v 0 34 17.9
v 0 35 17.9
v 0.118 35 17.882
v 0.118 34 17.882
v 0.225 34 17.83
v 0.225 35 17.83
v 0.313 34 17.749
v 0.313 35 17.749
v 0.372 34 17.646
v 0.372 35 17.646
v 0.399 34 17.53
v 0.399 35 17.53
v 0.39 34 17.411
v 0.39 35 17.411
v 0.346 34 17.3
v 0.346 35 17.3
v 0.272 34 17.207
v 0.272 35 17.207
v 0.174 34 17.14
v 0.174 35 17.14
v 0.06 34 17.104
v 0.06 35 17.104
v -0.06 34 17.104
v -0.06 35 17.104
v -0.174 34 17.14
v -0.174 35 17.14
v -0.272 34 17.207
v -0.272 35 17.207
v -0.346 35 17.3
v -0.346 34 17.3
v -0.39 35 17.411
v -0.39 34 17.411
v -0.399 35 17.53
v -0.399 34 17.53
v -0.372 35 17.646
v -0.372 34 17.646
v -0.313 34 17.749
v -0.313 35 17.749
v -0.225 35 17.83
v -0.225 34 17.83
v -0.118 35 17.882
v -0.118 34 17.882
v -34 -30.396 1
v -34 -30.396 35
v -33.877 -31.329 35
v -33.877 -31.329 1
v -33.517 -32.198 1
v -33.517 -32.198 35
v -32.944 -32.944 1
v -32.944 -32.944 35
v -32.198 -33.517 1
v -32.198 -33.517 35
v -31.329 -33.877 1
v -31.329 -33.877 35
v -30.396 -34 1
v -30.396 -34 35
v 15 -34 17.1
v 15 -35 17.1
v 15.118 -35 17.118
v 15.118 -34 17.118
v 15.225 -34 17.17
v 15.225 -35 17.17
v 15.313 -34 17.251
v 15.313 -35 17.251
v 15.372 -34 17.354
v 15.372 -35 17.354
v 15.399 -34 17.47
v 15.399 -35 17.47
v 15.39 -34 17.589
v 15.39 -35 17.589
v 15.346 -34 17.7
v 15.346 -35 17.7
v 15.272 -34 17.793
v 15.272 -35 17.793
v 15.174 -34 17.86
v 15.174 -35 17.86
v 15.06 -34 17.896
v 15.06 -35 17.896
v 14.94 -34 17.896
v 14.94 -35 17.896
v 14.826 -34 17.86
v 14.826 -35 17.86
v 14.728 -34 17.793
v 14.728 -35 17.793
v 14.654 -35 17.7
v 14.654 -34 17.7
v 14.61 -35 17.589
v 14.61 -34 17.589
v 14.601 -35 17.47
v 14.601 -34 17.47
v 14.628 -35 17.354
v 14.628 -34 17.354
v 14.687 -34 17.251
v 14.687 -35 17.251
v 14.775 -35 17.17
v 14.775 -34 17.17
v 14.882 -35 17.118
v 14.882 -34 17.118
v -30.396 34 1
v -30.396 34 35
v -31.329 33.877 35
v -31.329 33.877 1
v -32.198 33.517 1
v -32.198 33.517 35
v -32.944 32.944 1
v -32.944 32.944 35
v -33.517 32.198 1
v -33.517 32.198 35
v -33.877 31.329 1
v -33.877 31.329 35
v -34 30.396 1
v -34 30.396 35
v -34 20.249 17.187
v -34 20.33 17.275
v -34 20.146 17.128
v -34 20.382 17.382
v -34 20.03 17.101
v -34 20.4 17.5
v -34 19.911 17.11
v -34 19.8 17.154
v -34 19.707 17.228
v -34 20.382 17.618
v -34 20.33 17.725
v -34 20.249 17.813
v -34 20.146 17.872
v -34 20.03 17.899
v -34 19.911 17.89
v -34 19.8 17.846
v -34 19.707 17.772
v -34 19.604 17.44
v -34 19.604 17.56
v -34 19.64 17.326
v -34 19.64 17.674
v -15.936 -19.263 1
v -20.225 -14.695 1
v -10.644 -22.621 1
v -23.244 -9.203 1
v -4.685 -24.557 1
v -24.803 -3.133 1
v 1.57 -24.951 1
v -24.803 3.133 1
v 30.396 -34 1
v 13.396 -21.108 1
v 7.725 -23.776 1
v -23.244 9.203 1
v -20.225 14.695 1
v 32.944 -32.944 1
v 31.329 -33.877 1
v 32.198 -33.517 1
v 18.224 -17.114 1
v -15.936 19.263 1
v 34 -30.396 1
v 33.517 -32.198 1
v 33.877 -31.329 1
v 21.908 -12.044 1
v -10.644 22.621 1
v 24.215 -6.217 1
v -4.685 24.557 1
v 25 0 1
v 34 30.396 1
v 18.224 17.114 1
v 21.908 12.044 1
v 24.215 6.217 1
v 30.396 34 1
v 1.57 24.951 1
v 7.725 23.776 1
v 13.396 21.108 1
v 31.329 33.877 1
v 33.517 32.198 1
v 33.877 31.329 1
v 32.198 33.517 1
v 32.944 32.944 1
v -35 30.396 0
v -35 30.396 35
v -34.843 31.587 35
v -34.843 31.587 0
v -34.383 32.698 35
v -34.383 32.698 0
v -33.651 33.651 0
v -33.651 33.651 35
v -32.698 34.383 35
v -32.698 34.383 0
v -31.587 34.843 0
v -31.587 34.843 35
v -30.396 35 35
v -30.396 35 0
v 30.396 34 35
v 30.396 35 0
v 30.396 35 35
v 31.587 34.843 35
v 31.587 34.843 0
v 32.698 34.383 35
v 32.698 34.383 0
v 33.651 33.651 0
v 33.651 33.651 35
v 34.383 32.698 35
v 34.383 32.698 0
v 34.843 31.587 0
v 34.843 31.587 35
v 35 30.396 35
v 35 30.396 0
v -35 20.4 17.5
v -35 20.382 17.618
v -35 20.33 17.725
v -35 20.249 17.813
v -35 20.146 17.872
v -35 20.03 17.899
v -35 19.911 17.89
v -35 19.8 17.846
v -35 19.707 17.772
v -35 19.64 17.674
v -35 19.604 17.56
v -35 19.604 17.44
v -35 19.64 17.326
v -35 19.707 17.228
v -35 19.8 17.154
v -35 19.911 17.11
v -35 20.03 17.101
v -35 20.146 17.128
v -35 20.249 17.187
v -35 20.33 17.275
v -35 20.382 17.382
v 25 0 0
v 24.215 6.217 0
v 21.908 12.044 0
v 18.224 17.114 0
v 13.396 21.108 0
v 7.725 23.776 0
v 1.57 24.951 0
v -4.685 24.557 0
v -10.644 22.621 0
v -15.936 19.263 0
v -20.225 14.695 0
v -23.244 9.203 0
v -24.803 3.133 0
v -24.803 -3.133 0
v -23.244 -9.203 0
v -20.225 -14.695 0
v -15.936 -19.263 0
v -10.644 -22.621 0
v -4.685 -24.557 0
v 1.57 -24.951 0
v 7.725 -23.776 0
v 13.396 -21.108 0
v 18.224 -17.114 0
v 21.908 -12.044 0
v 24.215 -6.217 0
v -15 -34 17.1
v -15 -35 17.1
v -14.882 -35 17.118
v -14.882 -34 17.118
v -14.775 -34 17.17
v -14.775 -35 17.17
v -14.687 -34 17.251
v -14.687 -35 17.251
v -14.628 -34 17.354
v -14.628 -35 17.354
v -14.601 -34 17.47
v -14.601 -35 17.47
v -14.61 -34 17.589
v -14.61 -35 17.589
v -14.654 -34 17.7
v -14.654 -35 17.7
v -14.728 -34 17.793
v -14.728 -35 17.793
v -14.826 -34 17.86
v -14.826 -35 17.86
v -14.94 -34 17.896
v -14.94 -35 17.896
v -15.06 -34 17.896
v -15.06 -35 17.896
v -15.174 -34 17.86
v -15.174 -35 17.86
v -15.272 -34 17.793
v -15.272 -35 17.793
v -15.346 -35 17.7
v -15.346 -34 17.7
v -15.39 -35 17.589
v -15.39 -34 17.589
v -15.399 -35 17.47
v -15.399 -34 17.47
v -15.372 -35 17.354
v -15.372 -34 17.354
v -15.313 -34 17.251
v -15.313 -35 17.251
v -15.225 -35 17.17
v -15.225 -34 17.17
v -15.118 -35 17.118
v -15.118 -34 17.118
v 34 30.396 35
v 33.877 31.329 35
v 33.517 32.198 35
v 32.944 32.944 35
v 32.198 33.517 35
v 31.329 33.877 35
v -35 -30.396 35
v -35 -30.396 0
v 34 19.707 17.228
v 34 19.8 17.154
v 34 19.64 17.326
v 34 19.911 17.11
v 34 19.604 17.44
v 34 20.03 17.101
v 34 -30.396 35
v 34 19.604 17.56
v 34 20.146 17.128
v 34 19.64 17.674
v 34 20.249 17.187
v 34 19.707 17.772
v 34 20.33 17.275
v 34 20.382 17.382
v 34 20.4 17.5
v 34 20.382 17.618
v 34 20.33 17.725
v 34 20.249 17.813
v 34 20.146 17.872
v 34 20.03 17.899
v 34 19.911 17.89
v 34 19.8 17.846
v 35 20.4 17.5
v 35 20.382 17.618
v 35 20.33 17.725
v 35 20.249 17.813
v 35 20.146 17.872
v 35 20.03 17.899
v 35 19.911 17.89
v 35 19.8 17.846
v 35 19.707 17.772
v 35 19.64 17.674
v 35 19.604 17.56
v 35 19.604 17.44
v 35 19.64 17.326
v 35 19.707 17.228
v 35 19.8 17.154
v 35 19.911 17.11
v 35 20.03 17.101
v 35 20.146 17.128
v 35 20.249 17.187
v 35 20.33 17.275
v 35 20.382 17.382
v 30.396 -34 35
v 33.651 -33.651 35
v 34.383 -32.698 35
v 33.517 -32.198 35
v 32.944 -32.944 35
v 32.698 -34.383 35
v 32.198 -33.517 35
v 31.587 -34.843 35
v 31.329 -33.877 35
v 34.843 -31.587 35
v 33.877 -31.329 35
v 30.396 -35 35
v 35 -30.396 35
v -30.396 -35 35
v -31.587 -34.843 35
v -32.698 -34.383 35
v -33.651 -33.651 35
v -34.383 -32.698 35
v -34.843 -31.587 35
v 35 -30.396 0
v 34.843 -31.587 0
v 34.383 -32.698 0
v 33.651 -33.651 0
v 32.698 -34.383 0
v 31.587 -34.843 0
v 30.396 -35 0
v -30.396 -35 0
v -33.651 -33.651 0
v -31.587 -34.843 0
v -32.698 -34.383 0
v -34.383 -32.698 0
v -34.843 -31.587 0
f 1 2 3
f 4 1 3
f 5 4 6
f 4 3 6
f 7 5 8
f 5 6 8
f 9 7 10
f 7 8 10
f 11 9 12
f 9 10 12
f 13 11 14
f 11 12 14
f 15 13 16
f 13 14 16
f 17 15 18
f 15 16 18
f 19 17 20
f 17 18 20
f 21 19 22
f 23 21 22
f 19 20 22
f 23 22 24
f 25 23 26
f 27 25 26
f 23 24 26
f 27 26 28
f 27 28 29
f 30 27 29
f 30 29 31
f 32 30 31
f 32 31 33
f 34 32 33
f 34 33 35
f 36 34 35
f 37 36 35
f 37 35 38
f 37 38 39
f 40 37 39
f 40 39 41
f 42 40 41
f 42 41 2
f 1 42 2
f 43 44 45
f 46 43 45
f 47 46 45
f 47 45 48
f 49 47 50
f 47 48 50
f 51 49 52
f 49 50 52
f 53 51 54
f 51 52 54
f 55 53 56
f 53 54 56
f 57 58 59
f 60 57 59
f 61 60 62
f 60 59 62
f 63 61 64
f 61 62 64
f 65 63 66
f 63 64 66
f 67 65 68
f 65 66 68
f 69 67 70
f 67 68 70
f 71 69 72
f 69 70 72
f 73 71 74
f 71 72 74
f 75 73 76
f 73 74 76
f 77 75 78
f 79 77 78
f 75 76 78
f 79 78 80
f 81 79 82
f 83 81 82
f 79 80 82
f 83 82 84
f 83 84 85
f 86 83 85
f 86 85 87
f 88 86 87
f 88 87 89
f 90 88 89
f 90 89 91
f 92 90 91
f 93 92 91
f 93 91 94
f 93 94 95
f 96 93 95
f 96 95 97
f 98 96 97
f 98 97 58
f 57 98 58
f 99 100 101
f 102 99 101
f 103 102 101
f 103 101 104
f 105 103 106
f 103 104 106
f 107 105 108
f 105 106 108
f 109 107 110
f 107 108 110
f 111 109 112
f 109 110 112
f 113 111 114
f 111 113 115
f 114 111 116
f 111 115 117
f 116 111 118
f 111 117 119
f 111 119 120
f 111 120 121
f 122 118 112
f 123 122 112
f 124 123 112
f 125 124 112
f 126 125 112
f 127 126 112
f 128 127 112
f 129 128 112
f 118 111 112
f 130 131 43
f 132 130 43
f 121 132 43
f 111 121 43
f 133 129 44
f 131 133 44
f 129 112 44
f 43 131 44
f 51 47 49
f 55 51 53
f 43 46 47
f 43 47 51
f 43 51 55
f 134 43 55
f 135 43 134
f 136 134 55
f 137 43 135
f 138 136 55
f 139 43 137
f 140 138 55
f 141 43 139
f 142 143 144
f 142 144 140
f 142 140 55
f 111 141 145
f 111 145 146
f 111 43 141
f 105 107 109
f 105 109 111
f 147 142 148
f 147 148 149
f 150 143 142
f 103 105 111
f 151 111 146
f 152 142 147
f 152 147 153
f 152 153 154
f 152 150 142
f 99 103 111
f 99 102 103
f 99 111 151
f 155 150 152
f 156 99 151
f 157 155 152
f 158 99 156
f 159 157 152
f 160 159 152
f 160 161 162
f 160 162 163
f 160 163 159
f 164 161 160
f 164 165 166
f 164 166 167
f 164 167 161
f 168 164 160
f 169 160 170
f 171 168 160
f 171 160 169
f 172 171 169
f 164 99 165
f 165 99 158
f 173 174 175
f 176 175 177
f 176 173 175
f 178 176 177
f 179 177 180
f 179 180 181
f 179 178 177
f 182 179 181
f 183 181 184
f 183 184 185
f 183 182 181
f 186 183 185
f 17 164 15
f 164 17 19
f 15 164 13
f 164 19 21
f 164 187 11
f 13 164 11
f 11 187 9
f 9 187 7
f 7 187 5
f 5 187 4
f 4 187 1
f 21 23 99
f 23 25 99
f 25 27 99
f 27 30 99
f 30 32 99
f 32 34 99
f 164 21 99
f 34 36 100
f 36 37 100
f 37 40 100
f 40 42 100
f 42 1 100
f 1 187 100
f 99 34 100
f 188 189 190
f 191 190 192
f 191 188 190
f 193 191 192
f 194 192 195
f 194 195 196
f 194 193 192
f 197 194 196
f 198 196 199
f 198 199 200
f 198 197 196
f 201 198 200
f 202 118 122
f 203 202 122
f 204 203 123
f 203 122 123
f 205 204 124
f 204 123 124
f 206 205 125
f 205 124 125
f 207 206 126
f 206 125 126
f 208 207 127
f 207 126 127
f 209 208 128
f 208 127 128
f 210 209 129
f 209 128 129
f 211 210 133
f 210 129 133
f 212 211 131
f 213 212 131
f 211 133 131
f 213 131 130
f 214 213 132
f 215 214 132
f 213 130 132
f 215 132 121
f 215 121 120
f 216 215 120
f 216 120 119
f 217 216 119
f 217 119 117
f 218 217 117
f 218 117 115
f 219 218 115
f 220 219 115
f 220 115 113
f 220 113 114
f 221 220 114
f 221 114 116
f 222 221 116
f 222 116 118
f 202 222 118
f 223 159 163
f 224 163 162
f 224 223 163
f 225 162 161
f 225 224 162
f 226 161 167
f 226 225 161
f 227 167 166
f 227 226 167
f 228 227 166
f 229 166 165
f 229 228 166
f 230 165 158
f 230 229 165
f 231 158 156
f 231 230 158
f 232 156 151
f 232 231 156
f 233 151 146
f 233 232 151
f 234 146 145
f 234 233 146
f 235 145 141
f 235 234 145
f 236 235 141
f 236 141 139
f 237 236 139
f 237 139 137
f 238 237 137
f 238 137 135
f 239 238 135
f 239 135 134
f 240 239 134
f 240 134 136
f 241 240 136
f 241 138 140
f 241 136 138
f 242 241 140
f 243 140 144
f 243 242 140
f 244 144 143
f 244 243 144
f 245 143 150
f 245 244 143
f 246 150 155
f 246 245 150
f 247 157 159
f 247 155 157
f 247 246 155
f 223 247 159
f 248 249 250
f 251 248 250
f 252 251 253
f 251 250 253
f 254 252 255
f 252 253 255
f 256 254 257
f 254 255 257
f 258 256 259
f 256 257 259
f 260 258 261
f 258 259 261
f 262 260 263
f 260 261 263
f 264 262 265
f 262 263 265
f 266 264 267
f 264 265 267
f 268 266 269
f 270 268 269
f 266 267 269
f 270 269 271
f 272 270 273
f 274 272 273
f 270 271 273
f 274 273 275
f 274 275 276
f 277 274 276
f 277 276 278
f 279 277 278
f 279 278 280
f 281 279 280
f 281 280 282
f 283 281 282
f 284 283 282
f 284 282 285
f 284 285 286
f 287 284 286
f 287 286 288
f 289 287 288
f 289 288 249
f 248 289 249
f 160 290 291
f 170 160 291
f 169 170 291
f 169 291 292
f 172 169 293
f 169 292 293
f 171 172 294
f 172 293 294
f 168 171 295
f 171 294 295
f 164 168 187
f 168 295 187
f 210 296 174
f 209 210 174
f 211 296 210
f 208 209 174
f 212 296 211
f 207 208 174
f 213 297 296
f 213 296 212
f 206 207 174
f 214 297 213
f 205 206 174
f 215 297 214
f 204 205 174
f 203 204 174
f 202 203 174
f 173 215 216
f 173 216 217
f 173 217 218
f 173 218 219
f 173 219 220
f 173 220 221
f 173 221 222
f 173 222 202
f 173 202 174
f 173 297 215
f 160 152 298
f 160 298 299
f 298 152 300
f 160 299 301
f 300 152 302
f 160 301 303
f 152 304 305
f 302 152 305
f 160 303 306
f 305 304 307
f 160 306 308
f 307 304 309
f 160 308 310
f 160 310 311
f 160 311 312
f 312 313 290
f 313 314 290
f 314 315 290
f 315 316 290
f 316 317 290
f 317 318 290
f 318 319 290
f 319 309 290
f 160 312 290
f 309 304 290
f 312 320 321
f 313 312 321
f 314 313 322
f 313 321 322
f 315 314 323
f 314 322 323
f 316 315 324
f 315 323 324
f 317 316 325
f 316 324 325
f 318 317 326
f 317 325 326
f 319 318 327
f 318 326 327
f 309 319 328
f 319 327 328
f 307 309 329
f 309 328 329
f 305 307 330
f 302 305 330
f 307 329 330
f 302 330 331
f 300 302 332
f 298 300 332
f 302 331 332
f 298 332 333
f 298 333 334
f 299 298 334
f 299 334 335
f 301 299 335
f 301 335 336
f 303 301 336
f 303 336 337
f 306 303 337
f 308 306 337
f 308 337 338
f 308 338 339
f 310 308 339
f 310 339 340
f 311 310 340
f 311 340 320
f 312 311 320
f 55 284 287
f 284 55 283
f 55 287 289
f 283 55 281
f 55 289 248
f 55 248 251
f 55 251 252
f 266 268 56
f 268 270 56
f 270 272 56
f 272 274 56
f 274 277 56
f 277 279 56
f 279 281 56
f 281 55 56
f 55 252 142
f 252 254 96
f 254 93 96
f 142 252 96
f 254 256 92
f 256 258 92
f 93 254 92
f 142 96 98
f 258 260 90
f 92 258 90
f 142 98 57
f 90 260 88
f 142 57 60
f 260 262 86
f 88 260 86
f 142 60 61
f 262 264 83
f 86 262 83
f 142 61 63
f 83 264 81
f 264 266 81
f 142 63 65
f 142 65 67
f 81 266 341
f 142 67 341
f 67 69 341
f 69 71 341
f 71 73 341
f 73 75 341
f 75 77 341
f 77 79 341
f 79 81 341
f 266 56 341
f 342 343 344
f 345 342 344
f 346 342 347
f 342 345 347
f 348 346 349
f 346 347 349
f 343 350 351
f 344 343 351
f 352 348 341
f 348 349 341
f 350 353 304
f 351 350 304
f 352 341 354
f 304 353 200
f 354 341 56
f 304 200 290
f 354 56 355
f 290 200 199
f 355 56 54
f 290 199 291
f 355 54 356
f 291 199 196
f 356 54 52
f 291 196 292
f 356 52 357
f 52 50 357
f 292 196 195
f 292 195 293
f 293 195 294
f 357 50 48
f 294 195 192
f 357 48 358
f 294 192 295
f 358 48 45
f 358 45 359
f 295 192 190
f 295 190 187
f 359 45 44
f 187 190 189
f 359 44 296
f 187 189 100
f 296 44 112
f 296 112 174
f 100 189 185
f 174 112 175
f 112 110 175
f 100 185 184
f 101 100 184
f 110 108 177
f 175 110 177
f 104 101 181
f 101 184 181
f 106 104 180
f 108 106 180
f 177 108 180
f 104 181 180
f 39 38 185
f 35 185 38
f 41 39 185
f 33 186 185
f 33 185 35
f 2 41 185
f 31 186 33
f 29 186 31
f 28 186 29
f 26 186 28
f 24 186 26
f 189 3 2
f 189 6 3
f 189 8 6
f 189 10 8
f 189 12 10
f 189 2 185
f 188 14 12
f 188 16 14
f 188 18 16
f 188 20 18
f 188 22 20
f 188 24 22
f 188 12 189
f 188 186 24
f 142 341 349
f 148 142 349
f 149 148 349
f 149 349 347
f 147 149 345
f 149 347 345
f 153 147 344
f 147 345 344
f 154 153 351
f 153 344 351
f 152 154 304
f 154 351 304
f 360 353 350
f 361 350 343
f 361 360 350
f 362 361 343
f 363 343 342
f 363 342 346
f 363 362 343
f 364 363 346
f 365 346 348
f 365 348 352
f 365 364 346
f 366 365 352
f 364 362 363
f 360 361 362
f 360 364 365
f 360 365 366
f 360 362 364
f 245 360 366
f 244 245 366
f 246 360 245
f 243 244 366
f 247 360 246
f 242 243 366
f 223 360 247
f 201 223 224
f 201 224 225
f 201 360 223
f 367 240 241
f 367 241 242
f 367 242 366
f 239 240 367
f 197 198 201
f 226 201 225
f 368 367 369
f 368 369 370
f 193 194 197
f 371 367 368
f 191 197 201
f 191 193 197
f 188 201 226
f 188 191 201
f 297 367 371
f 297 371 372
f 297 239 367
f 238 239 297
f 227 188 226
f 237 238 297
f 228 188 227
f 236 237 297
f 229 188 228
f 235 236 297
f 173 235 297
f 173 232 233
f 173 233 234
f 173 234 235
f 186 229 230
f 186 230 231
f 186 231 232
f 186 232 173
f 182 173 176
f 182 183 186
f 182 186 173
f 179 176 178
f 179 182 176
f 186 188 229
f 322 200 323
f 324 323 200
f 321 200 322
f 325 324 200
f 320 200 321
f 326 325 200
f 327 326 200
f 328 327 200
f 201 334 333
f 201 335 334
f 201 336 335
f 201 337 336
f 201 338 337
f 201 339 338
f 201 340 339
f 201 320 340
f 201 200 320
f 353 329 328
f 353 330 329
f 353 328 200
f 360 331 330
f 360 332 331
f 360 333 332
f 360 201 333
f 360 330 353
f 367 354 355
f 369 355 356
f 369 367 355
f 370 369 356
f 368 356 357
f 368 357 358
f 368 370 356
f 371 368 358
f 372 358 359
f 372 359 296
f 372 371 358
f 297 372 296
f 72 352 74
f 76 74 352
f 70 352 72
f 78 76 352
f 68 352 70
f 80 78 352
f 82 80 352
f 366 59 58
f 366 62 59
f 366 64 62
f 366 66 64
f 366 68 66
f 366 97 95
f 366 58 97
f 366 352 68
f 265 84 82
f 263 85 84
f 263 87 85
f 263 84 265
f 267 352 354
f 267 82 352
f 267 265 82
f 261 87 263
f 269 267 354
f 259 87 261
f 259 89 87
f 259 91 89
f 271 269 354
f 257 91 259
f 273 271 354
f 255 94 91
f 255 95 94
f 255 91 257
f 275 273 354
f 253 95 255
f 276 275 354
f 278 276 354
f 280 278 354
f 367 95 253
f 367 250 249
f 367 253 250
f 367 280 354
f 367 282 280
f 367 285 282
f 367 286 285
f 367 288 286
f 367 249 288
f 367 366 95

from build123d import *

# Parameters (mm, degrees)
SKETCH1_R           = 25
BOSS_EXTRUDE1_DEPTH = 35
CUT_EXTRUDE1_DEPTH  = 34
SKETCH3_R           = 0.4
CUT_EXTRUDE2_DEPTH  = 78
SKETCH4_R           = 0.4
CUT_EXTRUDE3_DEPTH  = 22
SKETCH5_R           = 0.4
CUT_EXTRUDE4_DEPTH  = 10


with BuildPart() as part:
    # Sketch1 → Boss-Extrude1 (new body)
    with BuildSketch(Plane.XY):
        with BuildLine():
            Line((-30.39566951, 35), (30.39566951, 35))
            ThreePointArc((30.39566951, 35), (33.651422822, 33.651422822), (35, 30.39566951))
            Line((35, 30.39566951), (35, -30.39566951))
            ThreePointArc((35, -30.39566951), (33.651422822, -33.651422822), (30.39566951, -35))
            Line((30.39566951, -35), (-30.39566951, -35))
            ThreePointArc((-30.39566951, -35), (-33.651422822, -33.651422822), (-35, -30.39566951))
            Line((-35, -30.39566951), (-35, 30.39566951))
            ThreePointArc((-35, 30.39566951), (-33.651422822, 33.651422822), (-30.39566951, 35))
        make_face()
        Circle(SKETCH1_R, mode=Mode.SUBTRACT)
    extrude(amount=BOSS_EXTRUDE1_DEPTH)

    # Sketch2 → Cut-Extrude1 (cut)
    with BuildSketch(Plane.XY.offset(35)):
        with BuildLine():
            Line((-30.39566951, -34), (30.39566951, -34))
            ThreePointArc((30.39566951, -34), (32.944316041, -32.944316041), (34, -30.39566951))
            Line((34, -30.39566951), (34, 30.39566951))
            ThreePointArc((34, 30.39566951), (32.944316041, 32.944316041), (30.39566951, 34))
            Line((30.39566951, 34), (-30.39566951, 34))
            ThreePointArc((-30.39566951, 34), (-32.944316041, 32.944316041), (-34, 30.39566951))
            Line((-34, 30.39566951), (-34, -30.39566951))
            ThreePointArc((-34, -30.39566951), (-32.944316041, -32.944316041), (-30.39566951, -34))
        make_face()
    extrude(amount=-CUT_EXTRUDE1_DEPTH, mode=Mode.SUBTRACT)

    # Sketch3 → Cut-Extrude2 (cut)
    with BuildSketch(Plane(origin=(35, 0, 0), x_dir=(0, 0, -1), z_dir=(1, 0, 0))):
        with Locations(Location((-17.5, 20, 0), (0, 0, 90))):
            Circle(SKETCH3_R)
    extrude(amount=-CUT_EXTRUDE2_DEPTH, mode=Mode.SUBTRACT)

    # Sketch4 → Cut-Extrude3 (cut)
    with BuildSketch(Plane(origin=(0, 35, 0), x_dir=(1, 0, 0), z_dir=(0, 1, 0))):
        with Locations(Location((0, -17.5, 0), (0, 0, 270))):
            Circle(SKETCH4_R)
    extrude(amount=-CUT_EXTRUDE3_DEPTH, mode=Mode.SUBTRACT)

    # Sketch5 → Cut-Extrude4 (cut)
    with BuildSketch(Plane.XZ.offset(35)):
        with Locations(Location((-15, 17.5, 0), (0, 0, 270))):
            Circle(SKETCH5_R)
        with Locations(Location((15, 17.5, 0), (0, 0, 270))):
            Circle(SKETCH5_R)
    extrude(amount=-CUT_EXTRUDE4_DEPTH, mode=Mode.SUBTRACT)


solid = part.part
